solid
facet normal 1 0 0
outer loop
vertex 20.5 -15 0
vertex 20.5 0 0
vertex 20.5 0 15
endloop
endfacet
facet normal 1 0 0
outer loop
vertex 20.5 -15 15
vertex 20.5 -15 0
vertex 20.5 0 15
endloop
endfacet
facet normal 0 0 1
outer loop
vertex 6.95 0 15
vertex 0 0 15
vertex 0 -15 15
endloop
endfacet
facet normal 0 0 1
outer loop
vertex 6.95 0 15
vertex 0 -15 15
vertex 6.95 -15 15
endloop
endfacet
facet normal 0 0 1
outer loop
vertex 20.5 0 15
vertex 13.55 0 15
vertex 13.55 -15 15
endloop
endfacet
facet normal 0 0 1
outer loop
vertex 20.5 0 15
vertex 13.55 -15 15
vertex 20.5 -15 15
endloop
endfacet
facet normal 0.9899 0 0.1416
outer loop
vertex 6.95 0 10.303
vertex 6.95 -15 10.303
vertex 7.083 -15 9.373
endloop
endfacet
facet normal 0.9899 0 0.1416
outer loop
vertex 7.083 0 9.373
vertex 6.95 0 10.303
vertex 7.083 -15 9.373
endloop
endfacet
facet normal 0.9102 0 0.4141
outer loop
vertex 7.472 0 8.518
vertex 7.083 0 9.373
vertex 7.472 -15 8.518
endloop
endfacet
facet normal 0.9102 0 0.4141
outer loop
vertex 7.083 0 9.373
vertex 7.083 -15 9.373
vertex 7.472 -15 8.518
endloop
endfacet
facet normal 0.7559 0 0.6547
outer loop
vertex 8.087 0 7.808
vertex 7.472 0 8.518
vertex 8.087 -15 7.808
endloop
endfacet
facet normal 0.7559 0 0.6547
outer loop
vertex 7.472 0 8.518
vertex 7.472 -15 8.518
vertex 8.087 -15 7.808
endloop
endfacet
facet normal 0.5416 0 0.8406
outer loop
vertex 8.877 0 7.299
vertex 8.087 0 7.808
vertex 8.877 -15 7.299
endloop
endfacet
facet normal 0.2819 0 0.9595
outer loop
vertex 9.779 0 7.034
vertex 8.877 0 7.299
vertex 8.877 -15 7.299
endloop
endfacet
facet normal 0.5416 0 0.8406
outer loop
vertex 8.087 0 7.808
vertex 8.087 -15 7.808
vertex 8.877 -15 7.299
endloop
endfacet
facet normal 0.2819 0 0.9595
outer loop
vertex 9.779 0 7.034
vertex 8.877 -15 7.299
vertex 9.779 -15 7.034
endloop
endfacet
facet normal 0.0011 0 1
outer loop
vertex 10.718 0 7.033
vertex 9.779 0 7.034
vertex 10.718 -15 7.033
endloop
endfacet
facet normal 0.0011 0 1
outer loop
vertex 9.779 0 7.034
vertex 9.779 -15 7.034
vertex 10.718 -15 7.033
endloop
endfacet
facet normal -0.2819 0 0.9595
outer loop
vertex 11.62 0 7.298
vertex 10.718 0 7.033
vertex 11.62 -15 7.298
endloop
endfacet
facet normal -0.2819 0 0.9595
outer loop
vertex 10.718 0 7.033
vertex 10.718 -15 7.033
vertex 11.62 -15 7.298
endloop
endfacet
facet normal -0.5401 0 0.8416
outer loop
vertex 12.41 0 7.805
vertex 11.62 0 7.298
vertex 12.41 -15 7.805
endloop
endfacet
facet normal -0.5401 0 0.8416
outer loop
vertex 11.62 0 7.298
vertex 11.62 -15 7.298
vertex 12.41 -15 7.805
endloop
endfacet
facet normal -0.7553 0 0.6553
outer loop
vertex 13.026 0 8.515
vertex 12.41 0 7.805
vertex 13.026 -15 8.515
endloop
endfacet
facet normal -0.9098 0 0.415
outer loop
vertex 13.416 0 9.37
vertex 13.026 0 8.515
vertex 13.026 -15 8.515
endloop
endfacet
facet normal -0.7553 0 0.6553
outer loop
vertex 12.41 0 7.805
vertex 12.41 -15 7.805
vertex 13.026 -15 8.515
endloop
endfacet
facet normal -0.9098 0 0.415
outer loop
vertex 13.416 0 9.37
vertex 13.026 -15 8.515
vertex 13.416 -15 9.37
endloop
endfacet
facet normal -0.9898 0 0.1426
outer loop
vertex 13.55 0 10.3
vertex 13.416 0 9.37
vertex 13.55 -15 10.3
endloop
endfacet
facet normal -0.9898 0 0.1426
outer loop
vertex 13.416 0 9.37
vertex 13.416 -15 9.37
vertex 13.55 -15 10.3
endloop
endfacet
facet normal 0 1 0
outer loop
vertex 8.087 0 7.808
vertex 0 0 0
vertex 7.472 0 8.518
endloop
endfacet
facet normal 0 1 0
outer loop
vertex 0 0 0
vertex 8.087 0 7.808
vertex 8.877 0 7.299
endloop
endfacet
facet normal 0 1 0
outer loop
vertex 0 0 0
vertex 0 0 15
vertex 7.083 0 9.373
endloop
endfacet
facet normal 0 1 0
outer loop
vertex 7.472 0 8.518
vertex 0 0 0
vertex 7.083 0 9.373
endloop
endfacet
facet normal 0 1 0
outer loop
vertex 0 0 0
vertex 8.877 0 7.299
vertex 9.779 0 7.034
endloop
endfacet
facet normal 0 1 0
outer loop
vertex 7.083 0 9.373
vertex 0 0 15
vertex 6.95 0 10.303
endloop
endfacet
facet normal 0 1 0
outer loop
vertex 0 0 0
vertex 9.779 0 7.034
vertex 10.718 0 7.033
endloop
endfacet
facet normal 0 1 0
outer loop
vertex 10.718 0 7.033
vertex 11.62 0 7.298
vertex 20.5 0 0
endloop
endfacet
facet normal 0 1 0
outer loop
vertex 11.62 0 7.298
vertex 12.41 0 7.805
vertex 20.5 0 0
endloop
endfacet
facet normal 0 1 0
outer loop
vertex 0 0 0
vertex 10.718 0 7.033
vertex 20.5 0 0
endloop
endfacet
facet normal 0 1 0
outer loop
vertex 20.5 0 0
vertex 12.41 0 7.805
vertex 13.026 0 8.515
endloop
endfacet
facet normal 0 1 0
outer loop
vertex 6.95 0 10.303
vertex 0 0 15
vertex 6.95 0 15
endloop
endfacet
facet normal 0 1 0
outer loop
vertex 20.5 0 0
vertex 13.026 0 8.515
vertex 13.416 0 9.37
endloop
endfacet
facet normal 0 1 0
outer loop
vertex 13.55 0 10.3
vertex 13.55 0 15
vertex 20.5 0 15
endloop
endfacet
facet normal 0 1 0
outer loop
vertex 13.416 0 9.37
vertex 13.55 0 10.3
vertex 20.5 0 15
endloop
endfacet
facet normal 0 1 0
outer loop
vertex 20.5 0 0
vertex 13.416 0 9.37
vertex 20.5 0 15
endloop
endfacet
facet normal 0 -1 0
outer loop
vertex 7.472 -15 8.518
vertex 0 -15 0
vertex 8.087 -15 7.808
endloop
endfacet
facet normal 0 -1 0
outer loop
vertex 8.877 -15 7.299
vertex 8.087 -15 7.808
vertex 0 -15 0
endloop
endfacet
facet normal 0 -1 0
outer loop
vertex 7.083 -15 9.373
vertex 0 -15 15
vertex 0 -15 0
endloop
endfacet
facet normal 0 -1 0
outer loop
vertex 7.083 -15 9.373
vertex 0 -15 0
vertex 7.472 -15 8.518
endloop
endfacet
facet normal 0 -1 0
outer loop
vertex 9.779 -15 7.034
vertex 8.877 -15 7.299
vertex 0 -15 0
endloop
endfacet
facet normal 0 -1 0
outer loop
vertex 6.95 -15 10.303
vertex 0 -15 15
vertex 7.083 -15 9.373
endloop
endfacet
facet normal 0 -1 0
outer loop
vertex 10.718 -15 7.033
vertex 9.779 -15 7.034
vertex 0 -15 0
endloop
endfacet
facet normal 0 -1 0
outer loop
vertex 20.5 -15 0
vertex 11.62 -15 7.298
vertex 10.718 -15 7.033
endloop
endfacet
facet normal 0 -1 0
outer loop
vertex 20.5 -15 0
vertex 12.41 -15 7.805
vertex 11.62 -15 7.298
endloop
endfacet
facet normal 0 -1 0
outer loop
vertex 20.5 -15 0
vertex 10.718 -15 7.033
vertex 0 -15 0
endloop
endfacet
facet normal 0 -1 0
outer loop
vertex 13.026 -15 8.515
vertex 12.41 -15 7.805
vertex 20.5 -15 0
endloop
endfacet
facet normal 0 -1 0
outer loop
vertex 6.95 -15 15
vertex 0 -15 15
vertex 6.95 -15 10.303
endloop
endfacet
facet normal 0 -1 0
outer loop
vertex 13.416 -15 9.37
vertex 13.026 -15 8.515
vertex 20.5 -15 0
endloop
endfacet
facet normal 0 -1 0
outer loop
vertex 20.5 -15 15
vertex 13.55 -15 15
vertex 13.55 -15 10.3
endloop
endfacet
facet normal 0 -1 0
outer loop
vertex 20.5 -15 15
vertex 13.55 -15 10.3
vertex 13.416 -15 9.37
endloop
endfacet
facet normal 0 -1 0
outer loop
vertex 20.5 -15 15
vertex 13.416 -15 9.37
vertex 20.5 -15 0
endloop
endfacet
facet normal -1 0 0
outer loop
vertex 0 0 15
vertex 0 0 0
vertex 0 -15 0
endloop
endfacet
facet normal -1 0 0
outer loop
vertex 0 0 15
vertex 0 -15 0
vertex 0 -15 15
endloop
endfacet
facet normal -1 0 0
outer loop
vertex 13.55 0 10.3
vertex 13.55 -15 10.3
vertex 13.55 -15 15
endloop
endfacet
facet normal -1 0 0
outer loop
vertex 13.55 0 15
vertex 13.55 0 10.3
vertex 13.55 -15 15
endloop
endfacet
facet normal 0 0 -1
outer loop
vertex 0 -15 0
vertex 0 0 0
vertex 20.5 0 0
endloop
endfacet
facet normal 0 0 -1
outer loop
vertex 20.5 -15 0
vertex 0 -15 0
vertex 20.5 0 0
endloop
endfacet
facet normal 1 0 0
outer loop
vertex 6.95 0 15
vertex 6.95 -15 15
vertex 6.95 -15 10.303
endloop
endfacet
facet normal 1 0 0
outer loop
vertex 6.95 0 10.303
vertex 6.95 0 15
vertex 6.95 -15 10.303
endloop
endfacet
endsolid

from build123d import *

# Parameters (mm, degrees)
F0_W     = 20.5
F0_H     = 15
F1_DEPTH = 15
F3_DEPTH = 15.001


with BuildPart() as f1:
    # F0 (on Front) → F1 (new body)
    with BuildSketch(Plane.XZ):
        with Locations((10.25, 7.5)):
            Rectangle(F0_W, F0_H)
    extrude(amount=F1_DEPTH)

    # F2 (on face) → F3 (cut, through all)
    with BuildSketch(Plane.XZ.offset(15)):
        with BuildLine():
            ThreePointArc((6.950002, 10.303269), (10.248365, 7), (13.55, 10.3))
            ThreePointArc((13.55, 10.3), (10.251635, 13.6), (6.950002, 10.303269))
        make_face()
        with BuildLine():
            ThreePointArc((6.950002, 10.303269), (10.251635, 13.6), (13.55, 10.3))
            Line((13.55, 10.3), (13.55, 15))
            Line((13.55, 15), (6.950002, 15))
            Line((6.950002, 15), (6.950002, 10.303269))
        make_face()
    extrude(amount=-F3_DEPTH, mode=Mode.SUBTRACT)


solid = f1.part
